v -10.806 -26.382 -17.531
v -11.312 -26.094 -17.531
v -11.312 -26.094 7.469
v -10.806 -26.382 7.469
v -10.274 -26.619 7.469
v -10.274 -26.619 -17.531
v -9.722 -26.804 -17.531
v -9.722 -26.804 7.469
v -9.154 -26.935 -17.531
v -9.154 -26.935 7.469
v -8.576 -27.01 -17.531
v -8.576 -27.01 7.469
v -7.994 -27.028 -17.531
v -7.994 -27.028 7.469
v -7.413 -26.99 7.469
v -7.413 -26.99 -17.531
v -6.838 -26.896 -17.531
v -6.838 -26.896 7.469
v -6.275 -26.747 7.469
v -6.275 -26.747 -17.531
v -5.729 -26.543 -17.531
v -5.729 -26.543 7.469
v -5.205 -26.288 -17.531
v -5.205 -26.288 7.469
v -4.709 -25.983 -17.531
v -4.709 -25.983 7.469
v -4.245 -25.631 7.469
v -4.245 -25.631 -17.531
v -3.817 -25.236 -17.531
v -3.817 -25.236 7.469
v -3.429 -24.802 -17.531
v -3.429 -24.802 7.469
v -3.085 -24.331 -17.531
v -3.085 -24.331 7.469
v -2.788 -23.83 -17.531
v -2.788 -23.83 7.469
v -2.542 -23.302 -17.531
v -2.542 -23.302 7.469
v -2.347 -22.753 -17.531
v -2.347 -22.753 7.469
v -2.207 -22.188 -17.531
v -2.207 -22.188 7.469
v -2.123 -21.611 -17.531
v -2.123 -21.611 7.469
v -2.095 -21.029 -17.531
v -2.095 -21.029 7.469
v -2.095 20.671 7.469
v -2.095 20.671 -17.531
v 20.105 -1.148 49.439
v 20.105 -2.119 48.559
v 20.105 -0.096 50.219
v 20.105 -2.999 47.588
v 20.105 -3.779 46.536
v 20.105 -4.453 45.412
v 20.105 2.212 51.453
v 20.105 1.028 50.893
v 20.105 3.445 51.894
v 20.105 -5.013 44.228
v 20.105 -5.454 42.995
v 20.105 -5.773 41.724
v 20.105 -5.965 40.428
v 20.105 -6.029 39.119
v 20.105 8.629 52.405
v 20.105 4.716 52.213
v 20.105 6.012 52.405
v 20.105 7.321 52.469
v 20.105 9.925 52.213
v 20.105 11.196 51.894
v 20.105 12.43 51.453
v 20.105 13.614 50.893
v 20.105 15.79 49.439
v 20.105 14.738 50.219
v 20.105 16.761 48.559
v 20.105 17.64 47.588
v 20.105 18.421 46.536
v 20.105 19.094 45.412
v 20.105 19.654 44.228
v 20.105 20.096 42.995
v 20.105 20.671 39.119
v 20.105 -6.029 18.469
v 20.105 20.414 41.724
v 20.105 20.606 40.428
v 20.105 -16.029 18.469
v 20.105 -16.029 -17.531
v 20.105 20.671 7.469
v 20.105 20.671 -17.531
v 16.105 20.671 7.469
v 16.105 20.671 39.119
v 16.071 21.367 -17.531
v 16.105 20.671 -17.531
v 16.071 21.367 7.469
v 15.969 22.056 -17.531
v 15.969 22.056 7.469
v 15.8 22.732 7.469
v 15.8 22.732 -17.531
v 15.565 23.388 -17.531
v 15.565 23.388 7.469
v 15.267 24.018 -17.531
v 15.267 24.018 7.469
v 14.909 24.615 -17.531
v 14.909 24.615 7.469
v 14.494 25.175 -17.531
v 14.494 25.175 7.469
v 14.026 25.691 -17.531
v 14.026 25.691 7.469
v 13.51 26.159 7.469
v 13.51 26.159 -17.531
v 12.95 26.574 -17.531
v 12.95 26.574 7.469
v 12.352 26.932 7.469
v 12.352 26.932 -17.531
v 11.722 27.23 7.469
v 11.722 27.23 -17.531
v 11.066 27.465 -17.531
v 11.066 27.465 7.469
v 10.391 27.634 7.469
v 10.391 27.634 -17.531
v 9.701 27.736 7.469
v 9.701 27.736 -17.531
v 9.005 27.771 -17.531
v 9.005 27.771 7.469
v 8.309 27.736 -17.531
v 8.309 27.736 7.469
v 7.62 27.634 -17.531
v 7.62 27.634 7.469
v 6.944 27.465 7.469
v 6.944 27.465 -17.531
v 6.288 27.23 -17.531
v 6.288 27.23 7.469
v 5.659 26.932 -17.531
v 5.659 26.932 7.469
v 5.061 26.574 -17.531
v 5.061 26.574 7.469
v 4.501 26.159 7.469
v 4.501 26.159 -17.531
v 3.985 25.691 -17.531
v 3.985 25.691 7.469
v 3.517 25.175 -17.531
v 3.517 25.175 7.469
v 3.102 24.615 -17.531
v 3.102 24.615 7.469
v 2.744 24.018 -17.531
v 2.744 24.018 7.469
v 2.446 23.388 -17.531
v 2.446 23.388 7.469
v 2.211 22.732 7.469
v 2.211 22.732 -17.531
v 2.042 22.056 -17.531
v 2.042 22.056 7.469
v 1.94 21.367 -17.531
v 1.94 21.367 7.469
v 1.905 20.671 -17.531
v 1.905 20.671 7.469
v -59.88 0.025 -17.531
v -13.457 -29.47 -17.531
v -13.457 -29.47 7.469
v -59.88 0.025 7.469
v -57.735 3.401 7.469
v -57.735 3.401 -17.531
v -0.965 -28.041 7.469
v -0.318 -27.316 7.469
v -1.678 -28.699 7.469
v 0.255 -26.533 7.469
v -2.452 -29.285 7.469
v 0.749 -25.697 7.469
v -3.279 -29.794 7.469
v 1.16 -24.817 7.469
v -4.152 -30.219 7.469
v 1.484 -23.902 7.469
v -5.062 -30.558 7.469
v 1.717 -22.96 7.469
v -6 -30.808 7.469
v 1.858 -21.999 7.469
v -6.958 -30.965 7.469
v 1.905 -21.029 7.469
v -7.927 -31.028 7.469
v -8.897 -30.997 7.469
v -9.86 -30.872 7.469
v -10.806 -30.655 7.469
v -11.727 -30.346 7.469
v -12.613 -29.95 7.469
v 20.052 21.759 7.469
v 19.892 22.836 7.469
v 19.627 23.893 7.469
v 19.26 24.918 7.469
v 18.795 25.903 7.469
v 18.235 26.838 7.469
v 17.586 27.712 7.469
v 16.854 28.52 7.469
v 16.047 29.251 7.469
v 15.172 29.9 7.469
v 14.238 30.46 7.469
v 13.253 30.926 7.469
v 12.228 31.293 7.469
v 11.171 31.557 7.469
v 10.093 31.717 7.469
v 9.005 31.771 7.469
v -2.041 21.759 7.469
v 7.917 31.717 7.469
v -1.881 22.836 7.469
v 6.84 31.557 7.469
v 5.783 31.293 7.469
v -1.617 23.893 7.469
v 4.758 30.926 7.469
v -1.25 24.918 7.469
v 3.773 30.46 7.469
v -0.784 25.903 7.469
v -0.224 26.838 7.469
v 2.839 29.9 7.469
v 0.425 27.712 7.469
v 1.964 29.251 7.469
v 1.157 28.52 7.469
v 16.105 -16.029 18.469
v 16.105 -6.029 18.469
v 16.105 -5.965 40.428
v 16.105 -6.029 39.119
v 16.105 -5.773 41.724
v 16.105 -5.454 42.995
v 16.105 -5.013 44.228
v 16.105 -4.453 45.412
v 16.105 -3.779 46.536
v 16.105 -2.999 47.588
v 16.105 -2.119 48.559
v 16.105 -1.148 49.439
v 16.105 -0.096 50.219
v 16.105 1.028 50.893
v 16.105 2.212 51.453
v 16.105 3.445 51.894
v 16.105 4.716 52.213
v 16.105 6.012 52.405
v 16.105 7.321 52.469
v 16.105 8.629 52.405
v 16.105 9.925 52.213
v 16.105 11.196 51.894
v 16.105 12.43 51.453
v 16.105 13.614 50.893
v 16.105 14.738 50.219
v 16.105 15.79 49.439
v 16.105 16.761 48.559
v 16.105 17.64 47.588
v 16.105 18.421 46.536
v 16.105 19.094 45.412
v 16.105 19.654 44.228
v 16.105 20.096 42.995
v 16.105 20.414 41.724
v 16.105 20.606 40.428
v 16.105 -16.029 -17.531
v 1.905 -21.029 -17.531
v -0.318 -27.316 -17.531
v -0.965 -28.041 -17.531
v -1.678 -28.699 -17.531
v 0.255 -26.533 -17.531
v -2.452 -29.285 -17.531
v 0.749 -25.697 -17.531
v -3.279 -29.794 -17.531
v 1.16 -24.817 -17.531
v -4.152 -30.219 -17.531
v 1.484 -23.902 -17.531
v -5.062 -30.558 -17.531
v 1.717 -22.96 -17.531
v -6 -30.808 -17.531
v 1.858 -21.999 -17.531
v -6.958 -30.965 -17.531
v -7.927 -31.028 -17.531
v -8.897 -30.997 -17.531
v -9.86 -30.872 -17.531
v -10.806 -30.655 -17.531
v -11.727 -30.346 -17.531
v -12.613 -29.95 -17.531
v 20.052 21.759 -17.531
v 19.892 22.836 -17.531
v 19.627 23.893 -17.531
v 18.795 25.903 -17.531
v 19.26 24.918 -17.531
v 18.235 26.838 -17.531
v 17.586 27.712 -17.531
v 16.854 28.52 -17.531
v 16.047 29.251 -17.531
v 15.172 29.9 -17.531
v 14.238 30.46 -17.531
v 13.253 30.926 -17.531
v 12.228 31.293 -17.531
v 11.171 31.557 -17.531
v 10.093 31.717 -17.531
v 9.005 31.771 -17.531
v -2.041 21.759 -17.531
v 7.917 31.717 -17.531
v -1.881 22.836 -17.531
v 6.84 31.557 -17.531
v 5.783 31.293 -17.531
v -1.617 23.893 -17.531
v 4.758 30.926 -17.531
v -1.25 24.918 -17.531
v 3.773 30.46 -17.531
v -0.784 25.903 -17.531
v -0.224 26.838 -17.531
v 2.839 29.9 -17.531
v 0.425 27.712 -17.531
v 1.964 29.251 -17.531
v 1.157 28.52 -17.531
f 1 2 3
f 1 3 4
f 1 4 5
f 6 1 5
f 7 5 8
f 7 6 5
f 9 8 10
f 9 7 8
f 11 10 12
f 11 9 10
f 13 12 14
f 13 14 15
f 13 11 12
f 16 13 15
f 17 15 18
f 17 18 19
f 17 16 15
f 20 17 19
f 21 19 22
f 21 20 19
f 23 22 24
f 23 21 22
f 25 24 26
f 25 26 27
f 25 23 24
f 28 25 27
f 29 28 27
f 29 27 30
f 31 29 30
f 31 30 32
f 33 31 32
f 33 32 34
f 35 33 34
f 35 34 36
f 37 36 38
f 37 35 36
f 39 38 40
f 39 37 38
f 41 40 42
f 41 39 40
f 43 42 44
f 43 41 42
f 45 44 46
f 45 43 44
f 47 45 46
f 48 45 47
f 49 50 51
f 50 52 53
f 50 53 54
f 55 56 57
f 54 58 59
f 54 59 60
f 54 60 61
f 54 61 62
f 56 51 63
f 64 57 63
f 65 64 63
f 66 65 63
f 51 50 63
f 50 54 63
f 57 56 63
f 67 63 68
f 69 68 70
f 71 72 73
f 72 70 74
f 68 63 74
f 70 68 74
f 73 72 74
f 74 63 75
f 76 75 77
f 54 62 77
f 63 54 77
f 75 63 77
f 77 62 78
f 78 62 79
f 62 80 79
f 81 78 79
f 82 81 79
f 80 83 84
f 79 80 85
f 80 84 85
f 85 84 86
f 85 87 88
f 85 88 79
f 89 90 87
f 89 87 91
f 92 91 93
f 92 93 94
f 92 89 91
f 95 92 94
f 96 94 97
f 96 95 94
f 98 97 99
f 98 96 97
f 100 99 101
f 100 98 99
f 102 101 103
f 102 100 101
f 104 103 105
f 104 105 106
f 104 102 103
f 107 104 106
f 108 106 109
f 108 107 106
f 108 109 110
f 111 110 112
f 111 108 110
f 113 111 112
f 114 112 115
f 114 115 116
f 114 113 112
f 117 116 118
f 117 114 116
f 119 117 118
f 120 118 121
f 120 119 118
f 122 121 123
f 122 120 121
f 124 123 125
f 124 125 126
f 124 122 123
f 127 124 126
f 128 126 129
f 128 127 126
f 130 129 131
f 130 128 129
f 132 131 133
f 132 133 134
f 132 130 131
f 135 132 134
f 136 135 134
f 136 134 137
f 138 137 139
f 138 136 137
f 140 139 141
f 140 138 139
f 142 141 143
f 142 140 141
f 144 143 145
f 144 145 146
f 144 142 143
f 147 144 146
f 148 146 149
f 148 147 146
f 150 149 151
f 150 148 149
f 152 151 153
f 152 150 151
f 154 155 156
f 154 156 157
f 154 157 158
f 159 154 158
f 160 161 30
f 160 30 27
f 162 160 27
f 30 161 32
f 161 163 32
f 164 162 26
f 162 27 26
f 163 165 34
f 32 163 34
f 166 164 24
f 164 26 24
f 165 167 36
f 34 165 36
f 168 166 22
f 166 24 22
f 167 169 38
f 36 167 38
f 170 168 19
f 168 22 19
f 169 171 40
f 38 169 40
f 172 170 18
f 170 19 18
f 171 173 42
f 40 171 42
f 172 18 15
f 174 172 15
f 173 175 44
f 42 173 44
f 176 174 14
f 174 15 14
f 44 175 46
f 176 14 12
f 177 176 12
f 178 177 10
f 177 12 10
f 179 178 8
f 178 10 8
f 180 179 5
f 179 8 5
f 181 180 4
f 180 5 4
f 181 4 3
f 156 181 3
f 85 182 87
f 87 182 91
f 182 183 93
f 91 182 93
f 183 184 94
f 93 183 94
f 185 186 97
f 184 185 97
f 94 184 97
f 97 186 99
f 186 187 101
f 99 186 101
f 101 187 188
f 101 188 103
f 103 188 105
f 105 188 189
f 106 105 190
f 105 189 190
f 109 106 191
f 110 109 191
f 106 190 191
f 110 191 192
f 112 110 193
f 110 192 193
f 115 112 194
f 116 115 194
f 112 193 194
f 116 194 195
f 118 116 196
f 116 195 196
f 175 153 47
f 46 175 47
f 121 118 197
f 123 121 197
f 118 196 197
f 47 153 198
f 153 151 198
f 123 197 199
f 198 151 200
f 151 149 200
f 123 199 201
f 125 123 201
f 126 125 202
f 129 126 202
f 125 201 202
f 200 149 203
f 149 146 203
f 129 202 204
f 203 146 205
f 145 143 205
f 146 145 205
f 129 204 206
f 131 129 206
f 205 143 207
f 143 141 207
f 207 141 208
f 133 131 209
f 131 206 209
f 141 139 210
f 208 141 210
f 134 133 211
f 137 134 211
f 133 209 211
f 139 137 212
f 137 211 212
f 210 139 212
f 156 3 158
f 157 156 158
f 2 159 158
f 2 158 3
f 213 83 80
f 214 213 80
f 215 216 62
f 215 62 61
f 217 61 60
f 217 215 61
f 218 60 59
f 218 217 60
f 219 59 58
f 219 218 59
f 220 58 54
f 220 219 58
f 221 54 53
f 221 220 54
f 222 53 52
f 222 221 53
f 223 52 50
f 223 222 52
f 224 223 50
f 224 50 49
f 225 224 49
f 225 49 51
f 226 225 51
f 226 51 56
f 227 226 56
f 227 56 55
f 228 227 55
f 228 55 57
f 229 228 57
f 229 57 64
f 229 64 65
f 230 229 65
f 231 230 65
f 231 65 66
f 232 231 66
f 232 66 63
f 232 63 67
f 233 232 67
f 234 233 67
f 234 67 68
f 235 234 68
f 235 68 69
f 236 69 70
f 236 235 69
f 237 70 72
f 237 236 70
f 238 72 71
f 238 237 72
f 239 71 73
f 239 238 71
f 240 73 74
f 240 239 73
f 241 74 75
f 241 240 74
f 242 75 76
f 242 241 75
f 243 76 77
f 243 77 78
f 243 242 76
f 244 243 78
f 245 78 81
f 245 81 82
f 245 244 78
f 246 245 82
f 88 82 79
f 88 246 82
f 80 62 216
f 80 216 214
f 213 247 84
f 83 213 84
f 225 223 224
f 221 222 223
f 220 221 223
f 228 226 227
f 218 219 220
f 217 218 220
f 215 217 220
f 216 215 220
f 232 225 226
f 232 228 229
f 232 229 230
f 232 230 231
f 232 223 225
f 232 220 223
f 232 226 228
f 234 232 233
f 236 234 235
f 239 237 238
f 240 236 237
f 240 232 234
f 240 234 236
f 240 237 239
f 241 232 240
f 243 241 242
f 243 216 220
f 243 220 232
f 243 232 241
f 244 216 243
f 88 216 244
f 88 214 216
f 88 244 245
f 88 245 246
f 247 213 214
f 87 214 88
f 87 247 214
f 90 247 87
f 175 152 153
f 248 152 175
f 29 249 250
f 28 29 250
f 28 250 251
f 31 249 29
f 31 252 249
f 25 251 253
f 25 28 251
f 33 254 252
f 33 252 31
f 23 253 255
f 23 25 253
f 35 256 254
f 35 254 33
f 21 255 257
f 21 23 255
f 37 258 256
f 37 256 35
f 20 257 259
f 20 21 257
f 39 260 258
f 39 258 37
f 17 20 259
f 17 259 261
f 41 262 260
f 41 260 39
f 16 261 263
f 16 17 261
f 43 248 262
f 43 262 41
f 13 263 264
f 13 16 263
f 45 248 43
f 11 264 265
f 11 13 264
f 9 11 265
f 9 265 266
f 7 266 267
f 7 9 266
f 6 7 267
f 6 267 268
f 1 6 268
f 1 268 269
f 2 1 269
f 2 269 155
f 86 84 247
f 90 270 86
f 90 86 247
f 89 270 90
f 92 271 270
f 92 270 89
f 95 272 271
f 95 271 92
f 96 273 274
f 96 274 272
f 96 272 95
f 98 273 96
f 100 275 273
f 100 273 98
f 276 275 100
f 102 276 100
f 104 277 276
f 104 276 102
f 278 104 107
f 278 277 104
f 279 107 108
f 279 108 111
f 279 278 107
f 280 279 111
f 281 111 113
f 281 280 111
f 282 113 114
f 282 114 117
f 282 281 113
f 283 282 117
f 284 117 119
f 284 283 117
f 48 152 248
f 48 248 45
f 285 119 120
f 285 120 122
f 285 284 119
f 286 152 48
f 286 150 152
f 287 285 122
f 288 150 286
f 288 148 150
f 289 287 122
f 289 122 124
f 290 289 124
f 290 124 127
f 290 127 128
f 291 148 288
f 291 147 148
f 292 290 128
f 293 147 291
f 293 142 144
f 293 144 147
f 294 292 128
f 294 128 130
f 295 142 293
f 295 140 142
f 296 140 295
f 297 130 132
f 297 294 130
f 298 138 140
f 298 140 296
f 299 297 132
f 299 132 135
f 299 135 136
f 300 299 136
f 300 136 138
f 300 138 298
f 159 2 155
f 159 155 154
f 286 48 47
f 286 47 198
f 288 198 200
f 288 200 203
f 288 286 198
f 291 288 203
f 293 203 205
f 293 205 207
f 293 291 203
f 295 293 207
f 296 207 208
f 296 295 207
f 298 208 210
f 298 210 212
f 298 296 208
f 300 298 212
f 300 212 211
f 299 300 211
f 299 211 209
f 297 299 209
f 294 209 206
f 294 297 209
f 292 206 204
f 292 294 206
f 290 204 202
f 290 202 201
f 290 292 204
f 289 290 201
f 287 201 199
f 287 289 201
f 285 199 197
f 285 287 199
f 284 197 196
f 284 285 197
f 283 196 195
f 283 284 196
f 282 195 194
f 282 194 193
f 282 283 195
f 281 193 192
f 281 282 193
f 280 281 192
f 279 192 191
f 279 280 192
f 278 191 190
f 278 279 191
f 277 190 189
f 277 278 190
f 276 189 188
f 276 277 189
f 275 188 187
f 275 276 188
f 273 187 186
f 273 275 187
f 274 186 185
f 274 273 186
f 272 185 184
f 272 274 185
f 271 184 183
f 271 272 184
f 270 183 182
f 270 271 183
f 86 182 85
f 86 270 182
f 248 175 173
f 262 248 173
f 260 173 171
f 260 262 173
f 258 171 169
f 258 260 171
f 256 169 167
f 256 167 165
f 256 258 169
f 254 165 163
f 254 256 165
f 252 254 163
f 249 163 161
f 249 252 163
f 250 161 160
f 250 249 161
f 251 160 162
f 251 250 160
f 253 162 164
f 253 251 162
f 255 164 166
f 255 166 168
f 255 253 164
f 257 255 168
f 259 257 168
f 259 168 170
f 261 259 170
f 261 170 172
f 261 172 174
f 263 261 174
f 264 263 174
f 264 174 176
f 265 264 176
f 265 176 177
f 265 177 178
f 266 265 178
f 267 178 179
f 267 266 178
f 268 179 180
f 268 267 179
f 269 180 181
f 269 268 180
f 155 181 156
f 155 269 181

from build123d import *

# Parameters (mm, degrees)
BASE_FLANGE1_DEPTH  = 2.5
SKETCH6_W           = 0.4
SKETCH6_H           = 3.67
BOSS_EXTRUDE1_DEPTH = 4.5
SKETCH7_W           = 3.4
SKETCH7_H           = 1
CUT_EXTRUDE1_DEPTH  = 12.139958989
FILLET1_RADIUS      = 1.335
FILLET1_LENGTH      = 0.4
SCALE1_SCALE        = 10


# Sheet-metal steps are written as plain solids
with BuildPart() as part:
    # Sketch1 → Base-Flange1 (new body)
    with BuildSketch(Plane.XY):
        with BuildLine():
            Line((0.71, -1.835), (0.71, 1.835))
            ThreePointArc((0.71, 1.835), (0, 2.545), (-0.71, 1.835))
            Line((-0.71, 1.835), (-0.71, -2.335))
            ThreePointArc((-0.71, -2.335), (-1.228475759, -3.211432773), (-2.246268811, -3.179047252))
            Line((-2.246268811, -3.179047252), (-6.888528694, -0.229568793))
            Line((-6.888528694, -0.229568793), (-6.67402117, 0.108050107))
            Line((-6.67402117, 0.108050107), (-2.031761286, -2.841428351))
            ThreePointArc((-2.031761286, -2.841428351), (-1.421085455, -2.860859664), (-1.11, -2.335))
            Line((-1.11, -2.335), (-1.11, 1.835))
            ThreePointArc((-1.11, 1.835), (0, 2.945), (1.11, 1.835))
            Line((1.11, 1.835), (1.11, -1.835))
            Line((1.11, -1.835), (0.71, -1.835))
        make_face()
    extrude(amount=BASE_FLANGE1_DEPTH)

    # Sketch6 → Boss-Extrude1 (add)
    with BuildSketch(Plane.XY.offset(2.5)):
        with Locations((0.91, 0)):
            Rectangle(SKETCH6_W, SKETCH6_H)
    extrude(amount=BOSS_EXTRUDE1_DEPTH)

    # Sketch7 → Cut-Extrude1 (cut, through all)
    with BuildSketch(Plane(origin=(1.11, 0, 0), x_dir=(0, 0, -1), z_dir=(1, 0, 0))):
        with Locations((-5.3, -1.335)):
            Rectangle(SKETCH7_W, SKETCH7_H)
    extrude(amount=-CUT_EXTRUDE1_DEPTH, mode=Mode.SUBTRACT)

    # Fillet1: full round fillet: the end face becomes a half cylinder, R = half its width
    fillet1_face = Plane((0.91, 0.5, 7), x_dir=(-1, 0, 0), z_dir=(0, 0, 1))  # on the end face: x along it, z out of the body
    fillet1_slab = fillet1_face.offset(-FILLET1_RADIUS / 2) * Box(FILLET1_LENGTH, 2 * FILLET1_RADIUS, FILLET1_RADIUS, mode=Mode.PRIVATE)  # the body's end, R deep
    fillet1_round = Plane((0.91, 0.5, 5.665), x_dir=(0, 0, 1), z_dir=(-1, 0, 0)) * Cylinder(FILLET1_RADIUS, FILLET1_LENGTH, mode=Mode.PRIVATE)  # its axis R under the face
    add(fillet1_slab - fillet1_round, mode=Mode.SUBTRACT)


with BuildPart() as part_1:
    # Scale1: scaled about (-1.000602335, -0.257853748, 1.947858074)
    add(part.part.scale(SCALE1_SCALE).moved(Location((9.005421015, 2.320683732, -17.530722666))))


solid = part_1.part
